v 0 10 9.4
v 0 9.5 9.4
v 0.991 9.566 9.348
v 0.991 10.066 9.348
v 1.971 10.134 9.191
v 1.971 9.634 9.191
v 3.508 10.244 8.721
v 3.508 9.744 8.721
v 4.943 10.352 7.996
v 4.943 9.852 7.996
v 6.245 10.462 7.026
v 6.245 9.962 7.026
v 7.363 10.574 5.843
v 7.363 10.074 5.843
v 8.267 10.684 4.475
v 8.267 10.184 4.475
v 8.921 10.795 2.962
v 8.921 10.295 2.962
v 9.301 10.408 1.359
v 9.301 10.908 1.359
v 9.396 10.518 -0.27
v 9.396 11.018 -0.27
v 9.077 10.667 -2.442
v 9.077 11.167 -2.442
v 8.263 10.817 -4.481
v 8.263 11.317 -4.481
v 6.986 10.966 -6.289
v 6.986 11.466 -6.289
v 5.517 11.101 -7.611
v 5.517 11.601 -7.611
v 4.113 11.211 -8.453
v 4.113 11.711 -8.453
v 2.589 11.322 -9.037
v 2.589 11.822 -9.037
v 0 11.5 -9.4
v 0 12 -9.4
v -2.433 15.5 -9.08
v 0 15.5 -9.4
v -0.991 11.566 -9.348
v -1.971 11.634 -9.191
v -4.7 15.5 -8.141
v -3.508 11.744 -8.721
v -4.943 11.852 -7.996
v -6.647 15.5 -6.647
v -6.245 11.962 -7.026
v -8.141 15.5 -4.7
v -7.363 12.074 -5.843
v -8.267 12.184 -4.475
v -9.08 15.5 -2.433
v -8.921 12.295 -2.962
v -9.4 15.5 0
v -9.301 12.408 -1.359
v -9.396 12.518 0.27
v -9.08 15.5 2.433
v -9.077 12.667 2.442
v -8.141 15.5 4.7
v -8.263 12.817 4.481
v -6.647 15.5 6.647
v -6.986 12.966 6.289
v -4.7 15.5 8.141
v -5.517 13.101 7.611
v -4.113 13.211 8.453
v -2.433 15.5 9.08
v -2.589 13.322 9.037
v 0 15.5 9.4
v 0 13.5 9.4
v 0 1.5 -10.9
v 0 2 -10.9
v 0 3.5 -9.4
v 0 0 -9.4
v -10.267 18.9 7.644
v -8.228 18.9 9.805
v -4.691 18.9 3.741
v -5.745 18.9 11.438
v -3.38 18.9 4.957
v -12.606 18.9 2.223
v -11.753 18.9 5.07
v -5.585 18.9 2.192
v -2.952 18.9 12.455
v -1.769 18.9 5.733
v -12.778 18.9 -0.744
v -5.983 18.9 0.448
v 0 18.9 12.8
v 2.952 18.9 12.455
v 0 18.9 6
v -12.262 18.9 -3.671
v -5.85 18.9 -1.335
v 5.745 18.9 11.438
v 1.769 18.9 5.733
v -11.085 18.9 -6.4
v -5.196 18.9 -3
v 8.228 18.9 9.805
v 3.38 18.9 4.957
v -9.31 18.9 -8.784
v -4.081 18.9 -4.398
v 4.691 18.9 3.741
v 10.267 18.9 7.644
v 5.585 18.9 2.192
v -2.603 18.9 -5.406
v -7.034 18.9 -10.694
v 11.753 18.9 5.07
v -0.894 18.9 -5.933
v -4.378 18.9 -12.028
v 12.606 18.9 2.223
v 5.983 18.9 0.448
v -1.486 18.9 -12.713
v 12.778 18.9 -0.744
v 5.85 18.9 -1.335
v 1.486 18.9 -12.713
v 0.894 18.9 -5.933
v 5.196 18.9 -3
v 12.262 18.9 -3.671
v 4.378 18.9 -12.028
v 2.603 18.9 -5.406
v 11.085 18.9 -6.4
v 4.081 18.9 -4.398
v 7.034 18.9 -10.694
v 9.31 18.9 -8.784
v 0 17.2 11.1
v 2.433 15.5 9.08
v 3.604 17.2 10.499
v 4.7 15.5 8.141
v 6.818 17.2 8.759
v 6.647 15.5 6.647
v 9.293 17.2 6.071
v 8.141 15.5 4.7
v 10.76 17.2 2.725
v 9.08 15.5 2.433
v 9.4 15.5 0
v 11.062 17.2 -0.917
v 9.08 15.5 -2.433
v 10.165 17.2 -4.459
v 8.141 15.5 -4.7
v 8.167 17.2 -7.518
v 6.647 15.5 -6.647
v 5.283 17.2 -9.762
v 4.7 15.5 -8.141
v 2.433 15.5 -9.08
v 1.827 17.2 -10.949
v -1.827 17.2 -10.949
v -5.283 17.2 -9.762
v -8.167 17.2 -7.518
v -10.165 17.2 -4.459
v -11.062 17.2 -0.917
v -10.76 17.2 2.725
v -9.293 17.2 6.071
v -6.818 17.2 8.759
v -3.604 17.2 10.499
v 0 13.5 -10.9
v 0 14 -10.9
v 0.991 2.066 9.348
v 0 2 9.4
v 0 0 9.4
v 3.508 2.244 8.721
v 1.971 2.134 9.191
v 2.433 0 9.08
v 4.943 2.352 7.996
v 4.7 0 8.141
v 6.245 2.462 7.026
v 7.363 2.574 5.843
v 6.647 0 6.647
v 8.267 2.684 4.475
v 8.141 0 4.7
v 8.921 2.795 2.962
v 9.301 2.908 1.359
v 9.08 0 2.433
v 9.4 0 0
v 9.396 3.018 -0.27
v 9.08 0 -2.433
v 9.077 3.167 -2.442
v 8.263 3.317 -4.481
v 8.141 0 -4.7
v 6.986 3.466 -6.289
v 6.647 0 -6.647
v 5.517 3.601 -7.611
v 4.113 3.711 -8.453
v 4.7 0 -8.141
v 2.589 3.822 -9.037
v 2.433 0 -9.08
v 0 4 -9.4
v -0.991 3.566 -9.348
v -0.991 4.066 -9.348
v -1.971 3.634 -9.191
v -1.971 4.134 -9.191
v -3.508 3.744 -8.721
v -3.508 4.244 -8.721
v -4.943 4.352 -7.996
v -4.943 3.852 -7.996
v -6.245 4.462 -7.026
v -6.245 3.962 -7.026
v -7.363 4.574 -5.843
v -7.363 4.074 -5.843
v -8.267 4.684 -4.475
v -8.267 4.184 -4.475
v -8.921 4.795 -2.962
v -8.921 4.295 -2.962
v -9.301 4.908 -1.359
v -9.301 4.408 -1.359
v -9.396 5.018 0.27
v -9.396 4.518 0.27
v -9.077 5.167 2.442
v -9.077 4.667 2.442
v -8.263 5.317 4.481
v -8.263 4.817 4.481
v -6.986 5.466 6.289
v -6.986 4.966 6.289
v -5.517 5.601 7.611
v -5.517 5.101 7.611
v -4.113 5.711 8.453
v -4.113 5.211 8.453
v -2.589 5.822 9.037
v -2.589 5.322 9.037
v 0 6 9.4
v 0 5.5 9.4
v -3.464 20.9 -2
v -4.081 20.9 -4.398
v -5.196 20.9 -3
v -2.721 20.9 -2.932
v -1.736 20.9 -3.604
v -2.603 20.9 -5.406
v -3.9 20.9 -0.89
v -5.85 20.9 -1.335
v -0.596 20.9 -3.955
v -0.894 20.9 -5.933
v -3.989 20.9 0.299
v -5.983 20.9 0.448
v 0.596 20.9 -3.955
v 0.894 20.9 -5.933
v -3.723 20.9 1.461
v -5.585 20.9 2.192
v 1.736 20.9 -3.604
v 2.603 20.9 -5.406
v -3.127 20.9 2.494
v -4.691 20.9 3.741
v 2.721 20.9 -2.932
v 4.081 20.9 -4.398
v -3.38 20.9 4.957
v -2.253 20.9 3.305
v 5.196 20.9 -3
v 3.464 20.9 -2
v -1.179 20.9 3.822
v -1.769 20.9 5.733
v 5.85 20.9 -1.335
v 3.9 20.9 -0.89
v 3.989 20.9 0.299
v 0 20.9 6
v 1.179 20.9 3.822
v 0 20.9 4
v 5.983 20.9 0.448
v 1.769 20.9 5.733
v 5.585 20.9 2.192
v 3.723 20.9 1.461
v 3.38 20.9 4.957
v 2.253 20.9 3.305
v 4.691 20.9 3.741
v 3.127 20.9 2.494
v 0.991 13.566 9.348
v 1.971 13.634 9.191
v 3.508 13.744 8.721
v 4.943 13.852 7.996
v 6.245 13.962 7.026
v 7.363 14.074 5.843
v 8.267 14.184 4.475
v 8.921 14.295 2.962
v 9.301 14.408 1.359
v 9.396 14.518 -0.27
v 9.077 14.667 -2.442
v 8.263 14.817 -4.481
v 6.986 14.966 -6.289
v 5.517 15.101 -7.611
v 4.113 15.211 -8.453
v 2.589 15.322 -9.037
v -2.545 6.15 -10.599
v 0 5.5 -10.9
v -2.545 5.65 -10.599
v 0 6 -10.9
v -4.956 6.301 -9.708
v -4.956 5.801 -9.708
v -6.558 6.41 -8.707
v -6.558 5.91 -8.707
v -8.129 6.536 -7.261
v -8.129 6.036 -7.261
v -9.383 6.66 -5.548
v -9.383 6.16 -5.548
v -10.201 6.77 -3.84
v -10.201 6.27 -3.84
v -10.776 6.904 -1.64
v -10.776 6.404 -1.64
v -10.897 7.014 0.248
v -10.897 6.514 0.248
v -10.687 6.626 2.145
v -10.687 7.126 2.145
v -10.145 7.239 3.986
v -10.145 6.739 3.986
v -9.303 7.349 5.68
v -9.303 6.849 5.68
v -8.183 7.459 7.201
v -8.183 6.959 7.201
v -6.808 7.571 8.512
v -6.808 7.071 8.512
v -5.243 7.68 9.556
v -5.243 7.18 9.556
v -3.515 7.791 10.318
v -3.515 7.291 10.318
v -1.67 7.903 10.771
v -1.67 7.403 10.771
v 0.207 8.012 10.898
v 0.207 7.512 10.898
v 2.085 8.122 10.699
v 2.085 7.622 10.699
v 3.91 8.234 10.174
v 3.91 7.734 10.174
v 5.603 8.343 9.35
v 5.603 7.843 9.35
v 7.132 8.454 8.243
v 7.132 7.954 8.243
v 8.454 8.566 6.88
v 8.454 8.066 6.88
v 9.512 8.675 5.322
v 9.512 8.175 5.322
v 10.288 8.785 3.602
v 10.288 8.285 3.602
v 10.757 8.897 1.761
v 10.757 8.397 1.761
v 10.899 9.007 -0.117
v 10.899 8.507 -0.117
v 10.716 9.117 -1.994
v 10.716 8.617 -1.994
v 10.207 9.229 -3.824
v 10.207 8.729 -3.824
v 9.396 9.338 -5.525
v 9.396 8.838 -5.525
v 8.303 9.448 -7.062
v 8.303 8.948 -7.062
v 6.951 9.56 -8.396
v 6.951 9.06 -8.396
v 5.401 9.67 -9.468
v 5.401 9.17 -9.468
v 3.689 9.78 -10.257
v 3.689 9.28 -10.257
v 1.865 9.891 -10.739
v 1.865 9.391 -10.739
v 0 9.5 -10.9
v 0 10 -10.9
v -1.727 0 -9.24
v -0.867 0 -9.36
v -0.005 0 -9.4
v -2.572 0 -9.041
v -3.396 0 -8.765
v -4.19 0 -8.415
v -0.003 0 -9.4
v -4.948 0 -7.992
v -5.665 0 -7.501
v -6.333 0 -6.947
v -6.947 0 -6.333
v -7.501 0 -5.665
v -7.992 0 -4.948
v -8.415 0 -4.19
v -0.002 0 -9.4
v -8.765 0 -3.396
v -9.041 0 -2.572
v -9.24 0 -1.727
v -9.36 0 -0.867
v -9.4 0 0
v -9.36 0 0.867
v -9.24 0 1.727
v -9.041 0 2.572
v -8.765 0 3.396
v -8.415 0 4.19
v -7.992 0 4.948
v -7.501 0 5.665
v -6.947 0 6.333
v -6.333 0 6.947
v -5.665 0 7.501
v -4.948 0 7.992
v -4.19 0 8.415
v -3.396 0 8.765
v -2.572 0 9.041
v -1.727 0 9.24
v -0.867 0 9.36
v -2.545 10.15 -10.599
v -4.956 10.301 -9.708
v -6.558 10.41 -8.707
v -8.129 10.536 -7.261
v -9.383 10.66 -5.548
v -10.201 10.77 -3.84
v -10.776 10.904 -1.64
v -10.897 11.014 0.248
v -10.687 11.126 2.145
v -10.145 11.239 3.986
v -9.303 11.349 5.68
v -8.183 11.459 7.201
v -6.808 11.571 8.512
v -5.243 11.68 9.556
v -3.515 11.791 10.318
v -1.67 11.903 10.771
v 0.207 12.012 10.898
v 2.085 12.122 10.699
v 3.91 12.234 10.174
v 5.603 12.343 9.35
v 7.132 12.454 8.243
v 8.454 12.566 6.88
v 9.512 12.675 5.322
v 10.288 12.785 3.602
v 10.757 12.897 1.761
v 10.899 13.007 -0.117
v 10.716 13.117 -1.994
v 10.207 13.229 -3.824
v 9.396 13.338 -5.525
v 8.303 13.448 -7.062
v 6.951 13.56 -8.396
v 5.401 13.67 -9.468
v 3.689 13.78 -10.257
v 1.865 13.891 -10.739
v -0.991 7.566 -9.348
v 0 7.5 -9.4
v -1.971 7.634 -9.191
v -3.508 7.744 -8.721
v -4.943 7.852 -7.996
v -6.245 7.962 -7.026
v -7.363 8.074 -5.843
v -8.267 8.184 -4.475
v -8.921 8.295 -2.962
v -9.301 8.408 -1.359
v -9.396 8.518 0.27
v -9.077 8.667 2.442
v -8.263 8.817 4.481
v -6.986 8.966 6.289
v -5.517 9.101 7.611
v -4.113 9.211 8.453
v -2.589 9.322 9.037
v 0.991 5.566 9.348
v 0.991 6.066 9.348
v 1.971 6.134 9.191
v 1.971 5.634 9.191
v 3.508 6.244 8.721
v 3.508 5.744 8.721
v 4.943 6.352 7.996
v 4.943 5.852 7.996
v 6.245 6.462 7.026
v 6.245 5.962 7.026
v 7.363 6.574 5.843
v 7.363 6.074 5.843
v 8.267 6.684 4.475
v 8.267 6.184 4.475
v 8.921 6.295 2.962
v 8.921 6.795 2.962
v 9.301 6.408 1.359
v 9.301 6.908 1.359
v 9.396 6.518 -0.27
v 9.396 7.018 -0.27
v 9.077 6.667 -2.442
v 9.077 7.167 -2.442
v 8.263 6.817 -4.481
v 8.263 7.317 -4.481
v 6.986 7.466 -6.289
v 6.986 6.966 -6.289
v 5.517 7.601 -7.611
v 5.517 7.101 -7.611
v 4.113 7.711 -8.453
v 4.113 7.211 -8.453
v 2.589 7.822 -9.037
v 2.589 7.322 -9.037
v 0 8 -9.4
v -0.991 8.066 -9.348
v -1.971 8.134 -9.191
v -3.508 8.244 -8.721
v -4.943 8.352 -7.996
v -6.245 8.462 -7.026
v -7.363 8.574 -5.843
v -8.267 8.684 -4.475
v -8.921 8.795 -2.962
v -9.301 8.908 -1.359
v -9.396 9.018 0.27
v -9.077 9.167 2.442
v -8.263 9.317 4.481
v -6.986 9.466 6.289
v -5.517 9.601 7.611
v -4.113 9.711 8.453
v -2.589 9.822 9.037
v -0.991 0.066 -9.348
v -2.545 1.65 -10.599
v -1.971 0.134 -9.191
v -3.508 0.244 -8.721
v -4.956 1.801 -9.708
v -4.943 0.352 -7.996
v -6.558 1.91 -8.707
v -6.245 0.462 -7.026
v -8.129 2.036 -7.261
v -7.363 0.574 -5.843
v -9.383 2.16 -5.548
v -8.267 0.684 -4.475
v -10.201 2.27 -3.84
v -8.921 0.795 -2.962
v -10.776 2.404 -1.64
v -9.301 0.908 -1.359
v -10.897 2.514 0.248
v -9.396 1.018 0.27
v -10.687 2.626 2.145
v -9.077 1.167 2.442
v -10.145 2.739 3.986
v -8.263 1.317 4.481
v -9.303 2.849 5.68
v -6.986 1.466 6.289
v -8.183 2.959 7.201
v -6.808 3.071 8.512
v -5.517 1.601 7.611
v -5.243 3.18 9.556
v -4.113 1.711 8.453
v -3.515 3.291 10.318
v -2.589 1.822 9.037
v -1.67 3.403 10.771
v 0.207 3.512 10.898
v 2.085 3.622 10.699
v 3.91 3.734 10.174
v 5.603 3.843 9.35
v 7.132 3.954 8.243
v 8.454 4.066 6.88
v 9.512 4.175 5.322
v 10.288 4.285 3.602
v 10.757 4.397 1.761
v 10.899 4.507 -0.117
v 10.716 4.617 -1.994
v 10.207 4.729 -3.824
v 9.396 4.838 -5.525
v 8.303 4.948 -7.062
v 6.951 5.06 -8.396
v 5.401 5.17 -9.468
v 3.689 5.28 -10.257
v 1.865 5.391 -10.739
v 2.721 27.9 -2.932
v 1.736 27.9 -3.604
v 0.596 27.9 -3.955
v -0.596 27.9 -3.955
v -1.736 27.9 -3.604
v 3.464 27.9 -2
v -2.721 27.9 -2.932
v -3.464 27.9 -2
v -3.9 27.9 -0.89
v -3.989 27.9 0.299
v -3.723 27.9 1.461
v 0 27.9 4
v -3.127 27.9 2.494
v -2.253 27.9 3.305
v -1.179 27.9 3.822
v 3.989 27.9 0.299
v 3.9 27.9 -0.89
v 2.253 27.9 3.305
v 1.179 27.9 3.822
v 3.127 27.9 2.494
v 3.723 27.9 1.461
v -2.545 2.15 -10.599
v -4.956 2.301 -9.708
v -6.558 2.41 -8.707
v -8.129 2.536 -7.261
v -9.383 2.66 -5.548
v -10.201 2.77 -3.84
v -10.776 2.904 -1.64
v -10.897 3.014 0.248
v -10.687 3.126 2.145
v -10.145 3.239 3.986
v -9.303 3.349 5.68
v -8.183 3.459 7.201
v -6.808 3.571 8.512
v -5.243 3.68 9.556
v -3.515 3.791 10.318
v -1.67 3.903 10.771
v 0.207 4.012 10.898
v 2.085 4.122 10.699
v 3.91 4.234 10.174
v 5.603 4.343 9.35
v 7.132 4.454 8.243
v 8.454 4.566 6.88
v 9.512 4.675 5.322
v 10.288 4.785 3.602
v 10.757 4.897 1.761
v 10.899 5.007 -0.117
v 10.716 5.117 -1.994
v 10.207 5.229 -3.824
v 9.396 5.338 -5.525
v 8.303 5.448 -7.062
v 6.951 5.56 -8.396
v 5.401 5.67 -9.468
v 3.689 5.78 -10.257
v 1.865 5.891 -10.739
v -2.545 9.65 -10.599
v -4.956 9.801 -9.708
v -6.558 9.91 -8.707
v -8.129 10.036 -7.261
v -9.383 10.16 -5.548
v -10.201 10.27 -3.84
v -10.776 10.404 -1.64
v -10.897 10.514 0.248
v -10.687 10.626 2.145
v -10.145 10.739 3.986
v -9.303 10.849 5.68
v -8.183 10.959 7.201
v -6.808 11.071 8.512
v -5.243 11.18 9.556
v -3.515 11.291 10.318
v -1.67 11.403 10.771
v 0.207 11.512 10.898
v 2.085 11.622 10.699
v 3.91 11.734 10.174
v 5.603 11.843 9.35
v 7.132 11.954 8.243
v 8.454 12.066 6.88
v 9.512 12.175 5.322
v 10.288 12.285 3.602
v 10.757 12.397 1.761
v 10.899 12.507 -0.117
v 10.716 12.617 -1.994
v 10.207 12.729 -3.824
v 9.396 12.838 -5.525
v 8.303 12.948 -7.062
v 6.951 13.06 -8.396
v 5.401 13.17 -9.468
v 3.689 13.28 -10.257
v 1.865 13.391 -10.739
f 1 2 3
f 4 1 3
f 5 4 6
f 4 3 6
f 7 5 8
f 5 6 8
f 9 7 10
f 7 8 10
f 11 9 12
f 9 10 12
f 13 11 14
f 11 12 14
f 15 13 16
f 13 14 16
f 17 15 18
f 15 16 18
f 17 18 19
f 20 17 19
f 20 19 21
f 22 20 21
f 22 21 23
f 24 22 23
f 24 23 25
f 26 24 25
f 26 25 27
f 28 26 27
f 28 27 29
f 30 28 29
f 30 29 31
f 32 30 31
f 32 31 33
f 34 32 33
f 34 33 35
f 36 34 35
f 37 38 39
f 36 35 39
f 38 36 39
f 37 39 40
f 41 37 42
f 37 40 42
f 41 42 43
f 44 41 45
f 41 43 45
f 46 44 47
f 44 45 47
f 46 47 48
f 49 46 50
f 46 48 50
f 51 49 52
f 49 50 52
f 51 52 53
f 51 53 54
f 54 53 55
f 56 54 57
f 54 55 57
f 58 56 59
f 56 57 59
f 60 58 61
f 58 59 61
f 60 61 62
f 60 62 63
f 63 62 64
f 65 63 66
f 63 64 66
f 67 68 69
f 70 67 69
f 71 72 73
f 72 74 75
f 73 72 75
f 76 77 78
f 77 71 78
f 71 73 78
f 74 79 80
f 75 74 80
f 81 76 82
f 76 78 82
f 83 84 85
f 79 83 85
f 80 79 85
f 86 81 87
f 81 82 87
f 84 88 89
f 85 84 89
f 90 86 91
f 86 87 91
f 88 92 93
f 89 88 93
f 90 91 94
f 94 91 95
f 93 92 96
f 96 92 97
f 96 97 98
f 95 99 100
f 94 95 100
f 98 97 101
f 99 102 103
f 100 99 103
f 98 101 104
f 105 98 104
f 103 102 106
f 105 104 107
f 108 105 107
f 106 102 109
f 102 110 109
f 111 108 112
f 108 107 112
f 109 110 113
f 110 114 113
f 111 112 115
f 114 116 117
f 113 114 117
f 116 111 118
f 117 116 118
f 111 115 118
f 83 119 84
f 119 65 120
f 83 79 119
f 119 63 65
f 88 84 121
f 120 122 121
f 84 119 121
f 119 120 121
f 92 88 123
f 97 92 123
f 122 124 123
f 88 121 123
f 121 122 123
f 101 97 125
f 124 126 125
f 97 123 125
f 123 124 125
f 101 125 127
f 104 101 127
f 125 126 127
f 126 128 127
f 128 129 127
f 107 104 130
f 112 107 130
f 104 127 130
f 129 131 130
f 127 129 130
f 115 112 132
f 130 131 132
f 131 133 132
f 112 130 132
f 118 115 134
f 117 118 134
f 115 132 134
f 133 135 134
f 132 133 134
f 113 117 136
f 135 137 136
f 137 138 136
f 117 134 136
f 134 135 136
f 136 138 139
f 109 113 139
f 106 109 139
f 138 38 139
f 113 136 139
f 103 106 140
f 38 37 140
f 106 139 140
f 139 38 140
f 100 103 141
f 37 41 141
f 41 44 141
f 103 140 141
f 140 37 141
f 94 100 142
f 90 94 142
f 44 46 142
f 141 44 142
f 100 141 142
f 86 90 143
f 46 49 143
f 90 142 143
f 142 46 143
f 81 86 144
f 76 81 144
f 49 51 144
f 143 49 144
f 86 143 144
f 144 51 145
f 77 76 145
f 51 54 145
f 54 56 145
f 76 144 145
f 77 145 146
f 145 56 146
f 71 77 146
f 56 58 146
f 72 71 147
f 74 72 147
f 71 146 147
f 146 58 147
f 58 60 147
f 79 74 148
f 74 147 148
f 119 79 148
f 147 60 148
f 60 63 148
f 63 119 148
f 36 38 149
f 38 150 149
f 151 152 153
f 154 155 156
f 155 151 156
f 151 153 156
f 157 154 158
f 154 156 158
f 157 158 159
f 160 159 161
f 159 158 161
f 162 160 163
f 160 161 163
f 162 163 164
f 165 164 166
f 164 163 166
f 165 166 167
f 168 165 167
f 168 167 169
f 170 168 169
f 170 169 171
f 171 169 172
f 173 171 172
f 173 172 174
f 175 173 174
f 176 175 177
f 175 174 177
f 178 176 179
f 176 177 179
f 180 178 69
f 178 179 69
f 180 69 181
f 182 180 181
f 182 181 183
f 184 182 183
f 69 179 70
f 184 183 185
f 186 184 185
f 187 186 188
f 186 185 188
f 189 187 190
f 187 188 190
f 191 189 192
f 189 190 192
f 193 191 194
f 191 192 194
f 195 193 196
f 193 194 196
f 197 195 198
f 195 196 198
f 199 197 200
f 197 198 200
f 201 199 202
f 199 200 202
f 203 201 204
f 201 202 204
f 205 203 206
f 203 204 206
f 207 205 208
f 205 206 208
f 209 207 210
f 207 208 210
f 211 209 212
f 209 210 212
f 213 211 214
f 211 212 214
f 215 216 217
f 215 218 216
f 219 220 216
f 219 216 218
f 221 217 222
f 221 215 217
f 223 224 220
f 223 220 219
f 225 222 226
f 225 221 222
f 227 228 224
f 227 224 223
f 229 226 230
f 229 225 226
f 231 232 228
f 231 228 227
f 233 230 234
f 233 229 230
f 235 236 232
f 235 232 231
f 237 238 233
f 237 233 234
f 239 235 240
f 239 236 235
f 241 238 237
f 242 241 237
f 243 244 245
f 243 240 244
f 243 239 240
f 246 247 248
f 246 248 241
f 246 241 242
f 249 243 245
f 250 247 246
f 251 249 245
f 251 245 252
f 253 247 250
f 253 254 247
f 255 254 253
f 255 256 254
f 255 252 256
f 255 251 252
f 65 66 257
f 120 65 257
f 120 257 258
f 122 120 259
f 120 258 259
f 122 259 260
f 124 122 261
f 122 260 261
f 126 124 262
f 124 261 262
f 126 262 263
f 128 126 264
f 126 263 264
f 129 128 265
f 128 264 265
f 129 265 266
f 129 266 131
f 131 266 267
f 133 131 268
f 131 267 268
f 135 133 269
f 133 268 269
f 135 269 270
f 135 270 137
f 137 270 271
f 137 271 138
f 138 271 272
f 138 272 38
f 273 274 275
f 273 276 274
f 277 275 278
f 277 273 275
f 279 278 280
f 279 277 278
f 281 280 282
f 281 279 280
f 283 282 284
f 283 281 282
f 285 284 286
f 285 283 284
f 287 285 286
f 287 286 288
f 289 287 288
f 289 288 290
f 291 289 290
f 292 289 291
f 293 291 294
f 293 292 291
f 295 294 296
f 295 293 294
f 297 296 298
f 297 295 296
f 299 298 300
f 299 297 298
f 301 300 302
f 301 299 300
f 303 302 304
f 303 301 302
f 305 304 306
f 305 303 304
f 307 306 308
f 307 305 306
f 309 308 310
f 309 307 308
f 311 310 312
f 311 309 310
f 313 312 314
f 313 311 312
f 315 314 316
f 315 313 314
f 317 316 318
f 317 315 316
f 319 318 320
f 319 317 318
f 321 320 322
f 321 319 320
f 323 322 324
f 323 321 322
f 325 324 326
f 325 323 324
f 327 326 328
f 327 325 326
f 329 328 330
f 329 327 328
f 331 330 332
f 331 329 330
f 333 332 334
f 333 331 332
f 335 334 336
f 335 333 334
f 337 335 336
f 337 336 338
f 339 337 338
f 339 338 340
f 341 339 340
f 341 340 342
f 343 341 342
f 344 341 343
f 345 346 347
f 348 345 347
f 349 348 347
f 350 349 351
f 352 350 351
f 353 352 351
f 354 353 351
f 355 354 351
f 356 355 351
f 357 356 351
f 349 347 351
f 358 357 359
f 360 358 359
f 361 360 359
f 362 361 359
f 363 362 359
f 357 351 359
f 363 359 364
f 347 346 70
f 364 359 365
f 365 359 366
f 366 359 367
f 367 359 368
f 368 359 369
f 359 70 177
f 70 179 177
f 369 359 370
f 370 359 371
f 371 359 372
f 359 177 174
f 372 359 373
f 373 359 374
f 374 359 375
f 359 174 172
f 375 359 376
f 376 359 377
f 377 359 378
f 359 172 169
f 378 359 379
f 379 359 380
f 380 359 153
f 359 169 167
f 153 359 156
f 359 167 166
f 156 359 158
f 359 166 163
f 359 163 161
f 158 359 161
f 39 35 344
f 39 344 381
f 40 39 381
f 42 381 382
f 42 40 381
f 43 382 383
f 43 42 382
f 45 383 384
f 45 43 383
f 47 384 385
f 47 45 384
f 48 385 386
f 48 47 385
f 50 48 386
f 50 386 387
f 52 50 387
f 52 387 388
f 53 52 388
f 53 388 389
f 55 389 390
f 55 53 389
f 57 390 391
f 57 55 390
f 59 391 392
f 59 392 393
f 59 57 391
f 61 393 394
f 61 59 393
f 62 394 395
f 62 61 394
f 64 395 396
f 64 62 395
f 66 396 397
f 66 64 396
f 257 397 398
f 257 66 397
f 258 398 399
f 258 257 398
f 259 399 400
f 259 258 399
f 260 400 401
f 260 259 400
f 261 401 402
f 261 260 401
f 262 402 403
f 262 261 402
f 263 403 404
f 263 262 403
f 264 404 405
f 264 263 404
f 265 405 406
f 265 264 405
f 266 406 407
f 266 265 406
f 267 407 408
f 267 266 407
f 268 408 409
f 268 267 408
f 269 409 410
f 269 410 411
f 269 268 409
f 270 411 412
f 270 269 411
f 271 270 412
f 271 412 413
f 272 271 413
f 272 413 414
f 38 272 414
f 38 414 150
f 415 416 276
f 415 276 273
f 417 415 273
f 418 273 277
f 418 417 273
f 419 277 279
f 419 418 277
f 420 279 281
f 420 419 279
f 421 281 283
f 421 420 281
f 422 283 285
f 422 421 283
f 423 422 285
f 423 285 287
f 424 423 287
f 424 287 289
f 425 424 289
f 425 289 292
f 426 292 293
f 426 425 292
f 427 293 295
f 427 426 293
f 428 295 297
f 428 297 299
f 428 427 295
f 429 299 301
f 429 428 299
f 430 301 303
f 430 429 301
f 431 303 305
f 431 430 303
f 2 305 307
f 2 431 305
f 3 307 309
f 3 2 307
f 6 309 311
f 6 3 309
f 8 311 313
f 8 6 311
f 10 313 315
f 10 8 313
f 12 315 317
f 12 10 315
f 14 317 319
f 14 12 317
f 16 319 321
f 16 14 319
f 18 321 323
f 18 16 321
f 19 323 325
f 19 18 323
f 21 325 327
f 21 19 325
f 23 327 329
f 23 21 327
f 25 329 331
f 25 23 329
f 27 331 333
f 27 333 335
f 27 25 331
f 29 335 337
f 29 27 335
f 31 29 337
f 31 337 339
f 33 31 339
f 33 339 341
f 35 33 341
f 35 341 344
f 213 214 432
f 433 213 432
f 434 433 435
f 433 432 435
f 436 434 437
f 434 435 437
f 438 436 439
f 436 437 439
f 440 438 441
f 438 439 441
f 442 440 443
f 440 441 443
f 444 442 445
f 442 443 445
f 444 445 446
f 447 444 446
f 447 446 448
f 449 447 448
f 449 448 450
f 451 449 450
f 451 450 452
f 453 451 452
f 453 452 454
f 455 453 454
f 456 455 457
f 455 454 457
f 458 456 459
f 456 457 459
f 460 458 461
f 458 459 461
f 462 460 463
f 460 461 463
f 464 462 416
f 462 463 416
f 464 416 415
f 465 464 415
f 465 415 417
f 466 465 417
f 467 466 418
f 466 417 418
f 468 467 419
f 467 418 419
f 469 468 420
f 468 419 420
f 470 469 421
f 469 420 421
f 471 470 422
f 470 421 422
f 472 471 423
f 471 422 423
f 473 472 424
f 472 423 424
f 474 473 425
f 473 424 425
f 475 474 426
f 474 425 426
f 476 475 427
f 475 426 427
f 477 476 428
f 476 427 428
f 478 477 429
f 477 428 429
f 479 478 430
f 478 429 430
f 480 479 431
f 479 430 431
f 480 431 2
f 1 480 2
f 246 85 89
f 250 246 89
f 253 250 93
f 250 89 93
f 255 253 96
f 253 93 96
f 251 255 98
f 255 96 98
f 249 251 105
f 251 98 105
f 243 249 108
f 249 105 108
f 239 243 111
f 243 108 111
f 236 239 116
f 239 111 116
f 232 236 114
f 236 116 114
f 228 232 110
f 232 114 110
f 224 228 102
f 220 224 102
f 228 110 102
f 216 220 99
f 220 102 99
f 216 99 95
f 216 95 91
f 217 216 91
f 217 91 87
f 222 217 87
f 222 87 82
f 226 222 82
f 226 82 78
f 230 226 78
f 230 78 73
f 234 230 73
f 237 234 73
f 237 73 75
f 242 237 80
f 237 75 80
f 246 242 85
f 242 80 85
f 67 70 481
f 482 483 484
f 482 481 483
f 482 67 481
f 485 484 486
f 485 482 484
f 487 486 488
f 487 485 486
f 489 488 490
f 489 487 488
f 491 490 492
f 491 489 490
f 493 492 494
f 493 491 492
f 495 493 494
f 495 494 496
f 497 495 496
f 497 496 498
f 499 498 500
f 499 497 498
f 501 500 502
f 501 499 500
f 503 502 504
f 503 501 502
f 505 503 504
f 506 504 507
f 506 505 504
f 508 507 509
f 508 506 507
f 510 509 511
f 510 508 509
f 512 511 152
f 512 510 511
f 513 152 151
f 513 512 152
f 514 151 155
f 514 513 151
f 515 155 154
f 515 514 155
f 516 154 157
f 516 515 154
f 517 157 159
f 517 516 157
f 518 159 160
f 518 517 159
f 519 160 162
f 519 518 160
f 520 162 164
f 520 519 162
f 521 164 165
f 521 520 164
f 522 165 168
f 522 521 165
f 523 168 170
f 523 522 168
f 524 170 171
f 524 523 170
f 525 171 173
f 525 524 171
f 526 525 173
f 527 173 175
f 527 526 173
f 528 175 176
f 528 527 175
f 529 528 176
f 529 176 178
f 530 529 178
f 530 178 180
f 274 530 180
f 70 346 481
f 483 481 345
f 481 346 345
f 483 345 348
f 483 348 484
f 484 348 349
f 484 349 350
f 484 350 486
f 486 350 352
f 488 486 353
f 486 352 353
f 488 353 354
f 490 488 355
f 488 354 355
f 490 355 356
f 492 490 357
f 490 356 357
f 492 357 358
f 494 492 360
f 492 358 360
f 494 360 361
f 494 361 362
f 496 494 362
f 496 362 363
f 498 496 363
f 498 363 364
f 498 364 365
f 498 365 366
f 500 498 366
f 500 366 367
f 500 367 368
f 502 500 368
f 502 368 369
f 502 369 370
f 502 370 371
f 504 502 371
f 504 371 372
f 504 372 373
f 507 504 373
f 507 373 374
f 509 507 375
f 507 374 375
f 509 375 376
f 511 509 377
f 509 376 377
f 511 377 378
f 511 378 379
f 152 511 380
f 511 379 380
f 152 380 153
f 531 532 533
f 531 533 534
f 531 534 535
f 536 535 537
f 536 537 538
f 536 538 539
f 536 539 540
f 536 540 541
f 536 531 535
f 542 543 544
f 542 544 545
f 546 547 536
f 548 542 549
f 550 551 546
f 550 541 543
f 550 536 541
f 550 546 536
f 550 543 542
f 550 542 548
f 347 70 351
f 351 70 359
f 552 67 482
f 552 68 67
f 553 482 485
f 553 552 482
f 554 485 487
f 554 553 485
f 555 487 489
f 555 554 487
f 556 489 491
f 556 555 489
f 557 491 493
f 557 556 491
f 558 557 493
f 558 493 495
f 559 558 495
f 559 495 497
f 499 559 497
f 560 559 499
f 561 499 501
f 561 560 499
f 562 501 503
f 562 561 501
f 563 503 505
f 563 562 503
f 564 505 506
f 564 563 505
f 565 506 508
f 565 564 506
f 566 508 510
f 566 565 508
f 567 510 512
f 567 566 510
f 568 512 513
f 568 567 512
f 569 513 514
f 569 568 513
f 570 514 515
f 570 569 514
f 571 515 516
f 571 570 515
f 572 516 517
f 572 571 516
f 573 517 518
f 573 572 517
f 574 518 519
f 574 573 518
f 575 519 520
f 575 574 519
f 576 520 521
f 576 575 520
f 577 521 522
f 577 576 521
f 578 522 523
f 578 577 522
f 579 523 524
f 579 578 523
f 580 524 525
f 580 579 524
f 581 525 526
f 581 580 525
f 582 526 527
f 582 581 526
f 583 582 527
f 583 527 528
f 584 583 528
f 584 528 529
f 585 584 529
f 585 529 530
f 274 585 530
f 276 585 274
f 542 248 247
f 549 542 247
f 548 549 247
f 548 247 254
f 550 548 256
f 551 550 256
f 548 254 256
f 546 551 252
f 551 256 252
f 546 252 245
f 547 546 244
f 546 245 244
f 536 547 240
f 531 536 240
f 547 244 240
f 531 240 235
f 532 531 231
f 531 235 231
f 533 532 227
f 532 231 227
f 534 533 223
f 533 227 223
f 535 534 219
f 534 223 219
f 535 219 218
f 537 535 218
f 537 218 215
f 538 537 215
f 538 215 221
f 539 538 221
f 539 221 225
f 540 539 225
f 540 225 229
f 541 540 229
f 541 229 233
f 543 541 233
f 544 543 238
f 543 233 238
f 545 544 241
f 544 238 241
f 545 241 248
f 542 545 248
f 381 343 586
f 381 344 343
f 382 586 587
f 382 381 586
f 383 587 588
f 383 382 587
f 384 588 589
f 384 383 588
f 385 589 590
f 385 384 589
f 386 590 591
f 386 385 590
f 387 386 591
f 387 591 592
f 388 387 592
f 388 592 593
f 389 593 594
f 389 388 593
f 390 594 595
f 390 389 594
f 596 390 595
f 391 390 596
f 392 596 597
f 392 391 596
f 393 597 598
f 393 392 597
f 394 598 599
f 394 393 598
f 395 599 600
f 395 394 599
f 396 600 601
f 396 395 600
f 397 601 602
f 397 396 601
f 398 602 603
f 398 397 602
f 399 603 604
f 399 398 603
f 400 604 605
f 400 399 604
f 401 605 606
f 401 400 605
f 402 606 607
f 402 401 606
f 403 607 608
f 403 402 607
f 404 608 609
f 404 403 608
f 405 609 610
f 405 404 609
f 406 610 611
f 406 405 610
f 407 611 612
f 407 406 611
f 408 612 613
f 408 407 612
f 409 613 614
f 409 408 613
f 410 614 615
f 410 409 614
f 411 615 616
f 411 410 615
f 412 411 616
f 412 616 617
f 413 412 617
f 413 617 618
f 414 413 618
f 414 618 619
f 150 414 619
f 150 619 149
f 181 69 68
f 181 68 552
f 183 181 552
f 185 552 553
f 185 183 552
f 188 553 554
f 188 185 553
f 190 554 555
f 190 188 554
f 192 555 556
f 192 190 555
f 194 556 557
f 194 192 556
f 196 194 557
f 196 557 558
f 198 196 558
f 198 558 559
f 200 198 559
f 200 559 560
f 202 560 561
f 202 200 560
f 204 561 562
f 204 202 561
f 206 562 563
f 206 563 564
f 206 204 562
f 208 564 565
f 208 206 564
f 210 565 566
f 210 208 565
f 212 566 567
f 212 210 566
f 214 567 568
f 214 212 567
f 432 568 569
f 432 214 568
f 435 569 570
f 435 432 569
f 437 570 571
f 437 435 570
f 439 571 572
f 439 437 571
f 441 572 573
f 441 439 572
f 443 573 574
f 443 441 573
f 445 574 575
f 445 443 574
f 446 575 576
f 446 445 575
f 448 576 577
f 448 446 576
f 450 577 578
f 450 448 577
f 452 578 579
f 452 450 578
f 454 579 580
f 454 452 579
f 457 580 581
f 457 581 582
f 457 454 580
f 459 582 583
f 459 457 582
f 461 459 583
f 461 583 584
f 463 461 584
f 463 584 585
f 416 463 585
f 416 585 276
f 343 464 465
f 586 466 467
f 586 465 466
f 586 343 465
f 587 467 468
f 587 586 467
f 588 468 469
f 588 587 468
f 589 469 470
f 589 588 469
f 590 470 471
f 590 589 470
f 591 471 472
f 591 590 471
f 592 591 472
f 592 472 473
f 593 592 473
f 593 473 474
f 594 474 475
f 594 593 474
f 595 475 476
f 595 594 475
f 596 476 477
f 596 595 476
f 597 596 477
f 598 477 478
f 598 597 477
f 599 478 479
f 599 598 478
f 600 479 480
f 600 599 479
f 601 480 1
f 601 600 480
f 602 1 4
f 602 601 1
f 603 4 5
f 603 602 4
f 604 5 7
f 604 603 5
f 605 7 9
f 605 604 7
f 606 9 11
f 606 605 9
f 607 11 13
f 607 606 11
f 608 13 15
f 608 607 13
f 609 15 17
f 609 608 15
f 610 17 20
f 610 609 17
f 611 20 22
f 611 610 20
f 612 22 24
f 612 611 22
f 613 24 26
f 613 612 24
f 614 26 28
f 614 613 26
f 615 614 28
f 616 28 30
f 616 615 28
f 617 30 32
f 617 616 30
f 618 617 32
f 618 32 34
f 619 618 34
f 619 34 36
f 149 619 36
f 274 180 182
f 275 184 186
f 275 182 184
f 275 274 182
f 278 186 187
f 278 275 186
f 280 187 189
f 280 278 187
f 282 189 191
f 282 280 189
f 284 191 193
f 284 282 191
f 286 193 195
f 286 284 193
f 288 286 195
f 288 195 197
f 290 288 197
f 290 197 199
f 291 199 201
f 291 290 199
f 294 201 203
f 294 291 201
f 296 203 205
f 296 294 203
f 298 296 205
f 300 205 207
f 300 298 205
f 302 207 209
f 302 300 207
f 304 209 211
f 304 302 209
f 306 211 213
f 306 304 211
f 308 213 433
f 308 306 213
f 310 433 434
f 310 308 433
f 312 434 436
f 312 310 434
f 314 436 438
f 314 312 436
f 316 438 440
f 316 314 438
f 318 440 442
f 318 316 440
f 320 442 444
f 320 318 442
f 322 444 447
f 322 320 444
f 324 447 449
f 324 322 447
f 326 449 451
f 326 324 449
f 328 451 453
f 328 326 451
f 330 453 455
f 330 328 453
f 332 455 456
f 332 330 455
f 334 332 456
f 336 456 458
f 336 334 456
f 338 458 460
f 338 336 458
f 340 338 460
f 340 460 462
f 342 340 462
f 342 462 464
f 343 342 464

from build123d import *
from build123d.topology import SkipClean

# Parameters (mm, degrees)
SKETCH_1_R      = 9.4
EXTRUDE_1_DEPTH = 15.5
SKETCH_3_R      = 6
EXTRUDE_2_DEPTH = 2
SKETCH_4_R      = 4
EXTRUDE_3_DEPTH = 7
SWEEP_1_PITCH   = 4


with BuildPart() as part:
    # 草图1 → 凸台-拉伸1 (new body)
    with BuildSketch(Plane(origin=(0, 0, 0), x_dir=(1, 0, 0), z_dir=(0, 1, 0))):
        with Locations(Location((0, 0, 0), (0, 0, 270))):
            Circle(SKETCH_1_R)
    extrude(amount=EXTRUDE_1_DEPTH)

    # 草图2 → 旋转1 (revolve)
    with BuildSketch(Plane.XY, mode=Mode.PRIVATE) as revolve_1_sk:
        Polygon((0, 18.9), (12.8, 18.9), (9.4, 15.5), (0, 15.5), align=None)
    revolve(revolve_1_sk.sketch.rotate(Axis((0, 15.5, 0), (0, 1, 0)), 270), axis=Axis((0, 15.5, 0), (0, 1, 0)))

    # 草图3 → 凸台-拉伸2 (add)
    with BuildSketch(Plane(origin=(0, 18.9, 0), x_dir=(1, 0, 0), z_dir=(0, 1, 0))):
        with Locations(Location((0, 0, 0), (0, 0, 270))):
            Circle(SKETCH_3_R)
    extrude(amount=EXTRUDE_2_DEPTH)

    # 草图4 → 凸台-拉伸3 (add)
    with BuildSketch(Plane(origin=(0, 20.9, 0), x_dir=(1, 0, 0), z_dir=(0, 1, 0))):
        with Locations(Location((0, 0, 0), (0, 0, 270))):
            Circle(SKETCH_4_R)
    extrude(amount=EXTRUDE_3_DEPTH)

    # 扫描1: the profile of 草图8 profile screwed along a right-hand helix of 3 turns, 12 arcs to a turn; built about Z, then put on its axis
    with SkipClean():  # the faces are left unmerged after this step: merging them gives an invalid solid
        sweep_1_z = Axis((0, 0, 0), (0, 0, 1))
        sweep_1_corners = [(9.3997, 0, 1.7503), (9.3997, 0, -1.7503), (10.9, 0, -0.25), (10.9, 0, 0.25)]
        with BuildLine(mode=Mode.PRIVATE) as sweep_1_profile:
            Line(sweep_1_corners[0], sweep_1_corners[1])
            Line(sweep_1_corners[1], sweep_1_corners[2])
            Line(sweep_1_corners[2], sweep_1_corners[3])
            Line(sweep_1_corners[3], sweep_1_corners[0])
        sweep_1_cap = Face(sweep_1_profile.wire())
        sweep_1_turn_angles = [0, 15, 30, 45, 60, 75, 90, 105, 120, 135, 150, 165, 180, 195, 210, 225, 240, 255, 270, 285, 300, 315, 330, 345, 360]
        sweep_1_turn_weights = [1, 0.9659258262890683, 1, 0.9659258262890683, 1, 0.9659258262890683, 1, 0.9659258262890683, 1, 0.9659258262890683, 1, 0.9659258262890683, 1, 0.9659258262890683, 1, 0.9659258262890683, 1, 0.9659258262890683, 1, 0.9659258262890683, 1, 0.9659258262890683, 1, 0.9659258262890683, 1]
        sweep_1_turn_rails = [Edge.make_bspline([Vector(p[0], p[1], 0).rotate(sweep_1_z, sweep_1_turn_angles[k]) / sweep_1_turn_weights[k] + Vector(0, 0, p[2] + SWEEP_1_PITCH * sweep_1_turn_angles[k] / 360) for k in range(25)], [0, 0, 0, 1, 1, 2, 2, 3, 3, 4, 4, 5, 5, 6, 6, 7, 7, 8, 8, 9, 9, 10, 10, 11, 11, 12, 12, 12], 2, sweep_1_turn_weights) for p in sweep_1_corners]
        sweep_1_turn_sides = [Face.make_surface_from_curves(sweep_1_turn_rails[p[0]], sweep_1_turn_rails[p[1]]) for p in [(0, 1), (1, 2), (2, 3), (3, 0)]]
        sweep_1 = Plane(origin=(0, 1.75, 0), x_dir=(0, 0, -1), z_dir=(0, 1, 0)) * Solid(Shell([*[p.moved(Location((0, 0, SWEEP_1_PITCH * i))) for i in range(3) for p in sweep_1_turn_sides], sweep_1_cap, sweep_1_cap.rotate(sweep_1_z, 1080).moved(Location((0, 0, SWEEP_1_PITCH * 1080 / 360)))]))
        add(sweep_1)


solid = part.part
